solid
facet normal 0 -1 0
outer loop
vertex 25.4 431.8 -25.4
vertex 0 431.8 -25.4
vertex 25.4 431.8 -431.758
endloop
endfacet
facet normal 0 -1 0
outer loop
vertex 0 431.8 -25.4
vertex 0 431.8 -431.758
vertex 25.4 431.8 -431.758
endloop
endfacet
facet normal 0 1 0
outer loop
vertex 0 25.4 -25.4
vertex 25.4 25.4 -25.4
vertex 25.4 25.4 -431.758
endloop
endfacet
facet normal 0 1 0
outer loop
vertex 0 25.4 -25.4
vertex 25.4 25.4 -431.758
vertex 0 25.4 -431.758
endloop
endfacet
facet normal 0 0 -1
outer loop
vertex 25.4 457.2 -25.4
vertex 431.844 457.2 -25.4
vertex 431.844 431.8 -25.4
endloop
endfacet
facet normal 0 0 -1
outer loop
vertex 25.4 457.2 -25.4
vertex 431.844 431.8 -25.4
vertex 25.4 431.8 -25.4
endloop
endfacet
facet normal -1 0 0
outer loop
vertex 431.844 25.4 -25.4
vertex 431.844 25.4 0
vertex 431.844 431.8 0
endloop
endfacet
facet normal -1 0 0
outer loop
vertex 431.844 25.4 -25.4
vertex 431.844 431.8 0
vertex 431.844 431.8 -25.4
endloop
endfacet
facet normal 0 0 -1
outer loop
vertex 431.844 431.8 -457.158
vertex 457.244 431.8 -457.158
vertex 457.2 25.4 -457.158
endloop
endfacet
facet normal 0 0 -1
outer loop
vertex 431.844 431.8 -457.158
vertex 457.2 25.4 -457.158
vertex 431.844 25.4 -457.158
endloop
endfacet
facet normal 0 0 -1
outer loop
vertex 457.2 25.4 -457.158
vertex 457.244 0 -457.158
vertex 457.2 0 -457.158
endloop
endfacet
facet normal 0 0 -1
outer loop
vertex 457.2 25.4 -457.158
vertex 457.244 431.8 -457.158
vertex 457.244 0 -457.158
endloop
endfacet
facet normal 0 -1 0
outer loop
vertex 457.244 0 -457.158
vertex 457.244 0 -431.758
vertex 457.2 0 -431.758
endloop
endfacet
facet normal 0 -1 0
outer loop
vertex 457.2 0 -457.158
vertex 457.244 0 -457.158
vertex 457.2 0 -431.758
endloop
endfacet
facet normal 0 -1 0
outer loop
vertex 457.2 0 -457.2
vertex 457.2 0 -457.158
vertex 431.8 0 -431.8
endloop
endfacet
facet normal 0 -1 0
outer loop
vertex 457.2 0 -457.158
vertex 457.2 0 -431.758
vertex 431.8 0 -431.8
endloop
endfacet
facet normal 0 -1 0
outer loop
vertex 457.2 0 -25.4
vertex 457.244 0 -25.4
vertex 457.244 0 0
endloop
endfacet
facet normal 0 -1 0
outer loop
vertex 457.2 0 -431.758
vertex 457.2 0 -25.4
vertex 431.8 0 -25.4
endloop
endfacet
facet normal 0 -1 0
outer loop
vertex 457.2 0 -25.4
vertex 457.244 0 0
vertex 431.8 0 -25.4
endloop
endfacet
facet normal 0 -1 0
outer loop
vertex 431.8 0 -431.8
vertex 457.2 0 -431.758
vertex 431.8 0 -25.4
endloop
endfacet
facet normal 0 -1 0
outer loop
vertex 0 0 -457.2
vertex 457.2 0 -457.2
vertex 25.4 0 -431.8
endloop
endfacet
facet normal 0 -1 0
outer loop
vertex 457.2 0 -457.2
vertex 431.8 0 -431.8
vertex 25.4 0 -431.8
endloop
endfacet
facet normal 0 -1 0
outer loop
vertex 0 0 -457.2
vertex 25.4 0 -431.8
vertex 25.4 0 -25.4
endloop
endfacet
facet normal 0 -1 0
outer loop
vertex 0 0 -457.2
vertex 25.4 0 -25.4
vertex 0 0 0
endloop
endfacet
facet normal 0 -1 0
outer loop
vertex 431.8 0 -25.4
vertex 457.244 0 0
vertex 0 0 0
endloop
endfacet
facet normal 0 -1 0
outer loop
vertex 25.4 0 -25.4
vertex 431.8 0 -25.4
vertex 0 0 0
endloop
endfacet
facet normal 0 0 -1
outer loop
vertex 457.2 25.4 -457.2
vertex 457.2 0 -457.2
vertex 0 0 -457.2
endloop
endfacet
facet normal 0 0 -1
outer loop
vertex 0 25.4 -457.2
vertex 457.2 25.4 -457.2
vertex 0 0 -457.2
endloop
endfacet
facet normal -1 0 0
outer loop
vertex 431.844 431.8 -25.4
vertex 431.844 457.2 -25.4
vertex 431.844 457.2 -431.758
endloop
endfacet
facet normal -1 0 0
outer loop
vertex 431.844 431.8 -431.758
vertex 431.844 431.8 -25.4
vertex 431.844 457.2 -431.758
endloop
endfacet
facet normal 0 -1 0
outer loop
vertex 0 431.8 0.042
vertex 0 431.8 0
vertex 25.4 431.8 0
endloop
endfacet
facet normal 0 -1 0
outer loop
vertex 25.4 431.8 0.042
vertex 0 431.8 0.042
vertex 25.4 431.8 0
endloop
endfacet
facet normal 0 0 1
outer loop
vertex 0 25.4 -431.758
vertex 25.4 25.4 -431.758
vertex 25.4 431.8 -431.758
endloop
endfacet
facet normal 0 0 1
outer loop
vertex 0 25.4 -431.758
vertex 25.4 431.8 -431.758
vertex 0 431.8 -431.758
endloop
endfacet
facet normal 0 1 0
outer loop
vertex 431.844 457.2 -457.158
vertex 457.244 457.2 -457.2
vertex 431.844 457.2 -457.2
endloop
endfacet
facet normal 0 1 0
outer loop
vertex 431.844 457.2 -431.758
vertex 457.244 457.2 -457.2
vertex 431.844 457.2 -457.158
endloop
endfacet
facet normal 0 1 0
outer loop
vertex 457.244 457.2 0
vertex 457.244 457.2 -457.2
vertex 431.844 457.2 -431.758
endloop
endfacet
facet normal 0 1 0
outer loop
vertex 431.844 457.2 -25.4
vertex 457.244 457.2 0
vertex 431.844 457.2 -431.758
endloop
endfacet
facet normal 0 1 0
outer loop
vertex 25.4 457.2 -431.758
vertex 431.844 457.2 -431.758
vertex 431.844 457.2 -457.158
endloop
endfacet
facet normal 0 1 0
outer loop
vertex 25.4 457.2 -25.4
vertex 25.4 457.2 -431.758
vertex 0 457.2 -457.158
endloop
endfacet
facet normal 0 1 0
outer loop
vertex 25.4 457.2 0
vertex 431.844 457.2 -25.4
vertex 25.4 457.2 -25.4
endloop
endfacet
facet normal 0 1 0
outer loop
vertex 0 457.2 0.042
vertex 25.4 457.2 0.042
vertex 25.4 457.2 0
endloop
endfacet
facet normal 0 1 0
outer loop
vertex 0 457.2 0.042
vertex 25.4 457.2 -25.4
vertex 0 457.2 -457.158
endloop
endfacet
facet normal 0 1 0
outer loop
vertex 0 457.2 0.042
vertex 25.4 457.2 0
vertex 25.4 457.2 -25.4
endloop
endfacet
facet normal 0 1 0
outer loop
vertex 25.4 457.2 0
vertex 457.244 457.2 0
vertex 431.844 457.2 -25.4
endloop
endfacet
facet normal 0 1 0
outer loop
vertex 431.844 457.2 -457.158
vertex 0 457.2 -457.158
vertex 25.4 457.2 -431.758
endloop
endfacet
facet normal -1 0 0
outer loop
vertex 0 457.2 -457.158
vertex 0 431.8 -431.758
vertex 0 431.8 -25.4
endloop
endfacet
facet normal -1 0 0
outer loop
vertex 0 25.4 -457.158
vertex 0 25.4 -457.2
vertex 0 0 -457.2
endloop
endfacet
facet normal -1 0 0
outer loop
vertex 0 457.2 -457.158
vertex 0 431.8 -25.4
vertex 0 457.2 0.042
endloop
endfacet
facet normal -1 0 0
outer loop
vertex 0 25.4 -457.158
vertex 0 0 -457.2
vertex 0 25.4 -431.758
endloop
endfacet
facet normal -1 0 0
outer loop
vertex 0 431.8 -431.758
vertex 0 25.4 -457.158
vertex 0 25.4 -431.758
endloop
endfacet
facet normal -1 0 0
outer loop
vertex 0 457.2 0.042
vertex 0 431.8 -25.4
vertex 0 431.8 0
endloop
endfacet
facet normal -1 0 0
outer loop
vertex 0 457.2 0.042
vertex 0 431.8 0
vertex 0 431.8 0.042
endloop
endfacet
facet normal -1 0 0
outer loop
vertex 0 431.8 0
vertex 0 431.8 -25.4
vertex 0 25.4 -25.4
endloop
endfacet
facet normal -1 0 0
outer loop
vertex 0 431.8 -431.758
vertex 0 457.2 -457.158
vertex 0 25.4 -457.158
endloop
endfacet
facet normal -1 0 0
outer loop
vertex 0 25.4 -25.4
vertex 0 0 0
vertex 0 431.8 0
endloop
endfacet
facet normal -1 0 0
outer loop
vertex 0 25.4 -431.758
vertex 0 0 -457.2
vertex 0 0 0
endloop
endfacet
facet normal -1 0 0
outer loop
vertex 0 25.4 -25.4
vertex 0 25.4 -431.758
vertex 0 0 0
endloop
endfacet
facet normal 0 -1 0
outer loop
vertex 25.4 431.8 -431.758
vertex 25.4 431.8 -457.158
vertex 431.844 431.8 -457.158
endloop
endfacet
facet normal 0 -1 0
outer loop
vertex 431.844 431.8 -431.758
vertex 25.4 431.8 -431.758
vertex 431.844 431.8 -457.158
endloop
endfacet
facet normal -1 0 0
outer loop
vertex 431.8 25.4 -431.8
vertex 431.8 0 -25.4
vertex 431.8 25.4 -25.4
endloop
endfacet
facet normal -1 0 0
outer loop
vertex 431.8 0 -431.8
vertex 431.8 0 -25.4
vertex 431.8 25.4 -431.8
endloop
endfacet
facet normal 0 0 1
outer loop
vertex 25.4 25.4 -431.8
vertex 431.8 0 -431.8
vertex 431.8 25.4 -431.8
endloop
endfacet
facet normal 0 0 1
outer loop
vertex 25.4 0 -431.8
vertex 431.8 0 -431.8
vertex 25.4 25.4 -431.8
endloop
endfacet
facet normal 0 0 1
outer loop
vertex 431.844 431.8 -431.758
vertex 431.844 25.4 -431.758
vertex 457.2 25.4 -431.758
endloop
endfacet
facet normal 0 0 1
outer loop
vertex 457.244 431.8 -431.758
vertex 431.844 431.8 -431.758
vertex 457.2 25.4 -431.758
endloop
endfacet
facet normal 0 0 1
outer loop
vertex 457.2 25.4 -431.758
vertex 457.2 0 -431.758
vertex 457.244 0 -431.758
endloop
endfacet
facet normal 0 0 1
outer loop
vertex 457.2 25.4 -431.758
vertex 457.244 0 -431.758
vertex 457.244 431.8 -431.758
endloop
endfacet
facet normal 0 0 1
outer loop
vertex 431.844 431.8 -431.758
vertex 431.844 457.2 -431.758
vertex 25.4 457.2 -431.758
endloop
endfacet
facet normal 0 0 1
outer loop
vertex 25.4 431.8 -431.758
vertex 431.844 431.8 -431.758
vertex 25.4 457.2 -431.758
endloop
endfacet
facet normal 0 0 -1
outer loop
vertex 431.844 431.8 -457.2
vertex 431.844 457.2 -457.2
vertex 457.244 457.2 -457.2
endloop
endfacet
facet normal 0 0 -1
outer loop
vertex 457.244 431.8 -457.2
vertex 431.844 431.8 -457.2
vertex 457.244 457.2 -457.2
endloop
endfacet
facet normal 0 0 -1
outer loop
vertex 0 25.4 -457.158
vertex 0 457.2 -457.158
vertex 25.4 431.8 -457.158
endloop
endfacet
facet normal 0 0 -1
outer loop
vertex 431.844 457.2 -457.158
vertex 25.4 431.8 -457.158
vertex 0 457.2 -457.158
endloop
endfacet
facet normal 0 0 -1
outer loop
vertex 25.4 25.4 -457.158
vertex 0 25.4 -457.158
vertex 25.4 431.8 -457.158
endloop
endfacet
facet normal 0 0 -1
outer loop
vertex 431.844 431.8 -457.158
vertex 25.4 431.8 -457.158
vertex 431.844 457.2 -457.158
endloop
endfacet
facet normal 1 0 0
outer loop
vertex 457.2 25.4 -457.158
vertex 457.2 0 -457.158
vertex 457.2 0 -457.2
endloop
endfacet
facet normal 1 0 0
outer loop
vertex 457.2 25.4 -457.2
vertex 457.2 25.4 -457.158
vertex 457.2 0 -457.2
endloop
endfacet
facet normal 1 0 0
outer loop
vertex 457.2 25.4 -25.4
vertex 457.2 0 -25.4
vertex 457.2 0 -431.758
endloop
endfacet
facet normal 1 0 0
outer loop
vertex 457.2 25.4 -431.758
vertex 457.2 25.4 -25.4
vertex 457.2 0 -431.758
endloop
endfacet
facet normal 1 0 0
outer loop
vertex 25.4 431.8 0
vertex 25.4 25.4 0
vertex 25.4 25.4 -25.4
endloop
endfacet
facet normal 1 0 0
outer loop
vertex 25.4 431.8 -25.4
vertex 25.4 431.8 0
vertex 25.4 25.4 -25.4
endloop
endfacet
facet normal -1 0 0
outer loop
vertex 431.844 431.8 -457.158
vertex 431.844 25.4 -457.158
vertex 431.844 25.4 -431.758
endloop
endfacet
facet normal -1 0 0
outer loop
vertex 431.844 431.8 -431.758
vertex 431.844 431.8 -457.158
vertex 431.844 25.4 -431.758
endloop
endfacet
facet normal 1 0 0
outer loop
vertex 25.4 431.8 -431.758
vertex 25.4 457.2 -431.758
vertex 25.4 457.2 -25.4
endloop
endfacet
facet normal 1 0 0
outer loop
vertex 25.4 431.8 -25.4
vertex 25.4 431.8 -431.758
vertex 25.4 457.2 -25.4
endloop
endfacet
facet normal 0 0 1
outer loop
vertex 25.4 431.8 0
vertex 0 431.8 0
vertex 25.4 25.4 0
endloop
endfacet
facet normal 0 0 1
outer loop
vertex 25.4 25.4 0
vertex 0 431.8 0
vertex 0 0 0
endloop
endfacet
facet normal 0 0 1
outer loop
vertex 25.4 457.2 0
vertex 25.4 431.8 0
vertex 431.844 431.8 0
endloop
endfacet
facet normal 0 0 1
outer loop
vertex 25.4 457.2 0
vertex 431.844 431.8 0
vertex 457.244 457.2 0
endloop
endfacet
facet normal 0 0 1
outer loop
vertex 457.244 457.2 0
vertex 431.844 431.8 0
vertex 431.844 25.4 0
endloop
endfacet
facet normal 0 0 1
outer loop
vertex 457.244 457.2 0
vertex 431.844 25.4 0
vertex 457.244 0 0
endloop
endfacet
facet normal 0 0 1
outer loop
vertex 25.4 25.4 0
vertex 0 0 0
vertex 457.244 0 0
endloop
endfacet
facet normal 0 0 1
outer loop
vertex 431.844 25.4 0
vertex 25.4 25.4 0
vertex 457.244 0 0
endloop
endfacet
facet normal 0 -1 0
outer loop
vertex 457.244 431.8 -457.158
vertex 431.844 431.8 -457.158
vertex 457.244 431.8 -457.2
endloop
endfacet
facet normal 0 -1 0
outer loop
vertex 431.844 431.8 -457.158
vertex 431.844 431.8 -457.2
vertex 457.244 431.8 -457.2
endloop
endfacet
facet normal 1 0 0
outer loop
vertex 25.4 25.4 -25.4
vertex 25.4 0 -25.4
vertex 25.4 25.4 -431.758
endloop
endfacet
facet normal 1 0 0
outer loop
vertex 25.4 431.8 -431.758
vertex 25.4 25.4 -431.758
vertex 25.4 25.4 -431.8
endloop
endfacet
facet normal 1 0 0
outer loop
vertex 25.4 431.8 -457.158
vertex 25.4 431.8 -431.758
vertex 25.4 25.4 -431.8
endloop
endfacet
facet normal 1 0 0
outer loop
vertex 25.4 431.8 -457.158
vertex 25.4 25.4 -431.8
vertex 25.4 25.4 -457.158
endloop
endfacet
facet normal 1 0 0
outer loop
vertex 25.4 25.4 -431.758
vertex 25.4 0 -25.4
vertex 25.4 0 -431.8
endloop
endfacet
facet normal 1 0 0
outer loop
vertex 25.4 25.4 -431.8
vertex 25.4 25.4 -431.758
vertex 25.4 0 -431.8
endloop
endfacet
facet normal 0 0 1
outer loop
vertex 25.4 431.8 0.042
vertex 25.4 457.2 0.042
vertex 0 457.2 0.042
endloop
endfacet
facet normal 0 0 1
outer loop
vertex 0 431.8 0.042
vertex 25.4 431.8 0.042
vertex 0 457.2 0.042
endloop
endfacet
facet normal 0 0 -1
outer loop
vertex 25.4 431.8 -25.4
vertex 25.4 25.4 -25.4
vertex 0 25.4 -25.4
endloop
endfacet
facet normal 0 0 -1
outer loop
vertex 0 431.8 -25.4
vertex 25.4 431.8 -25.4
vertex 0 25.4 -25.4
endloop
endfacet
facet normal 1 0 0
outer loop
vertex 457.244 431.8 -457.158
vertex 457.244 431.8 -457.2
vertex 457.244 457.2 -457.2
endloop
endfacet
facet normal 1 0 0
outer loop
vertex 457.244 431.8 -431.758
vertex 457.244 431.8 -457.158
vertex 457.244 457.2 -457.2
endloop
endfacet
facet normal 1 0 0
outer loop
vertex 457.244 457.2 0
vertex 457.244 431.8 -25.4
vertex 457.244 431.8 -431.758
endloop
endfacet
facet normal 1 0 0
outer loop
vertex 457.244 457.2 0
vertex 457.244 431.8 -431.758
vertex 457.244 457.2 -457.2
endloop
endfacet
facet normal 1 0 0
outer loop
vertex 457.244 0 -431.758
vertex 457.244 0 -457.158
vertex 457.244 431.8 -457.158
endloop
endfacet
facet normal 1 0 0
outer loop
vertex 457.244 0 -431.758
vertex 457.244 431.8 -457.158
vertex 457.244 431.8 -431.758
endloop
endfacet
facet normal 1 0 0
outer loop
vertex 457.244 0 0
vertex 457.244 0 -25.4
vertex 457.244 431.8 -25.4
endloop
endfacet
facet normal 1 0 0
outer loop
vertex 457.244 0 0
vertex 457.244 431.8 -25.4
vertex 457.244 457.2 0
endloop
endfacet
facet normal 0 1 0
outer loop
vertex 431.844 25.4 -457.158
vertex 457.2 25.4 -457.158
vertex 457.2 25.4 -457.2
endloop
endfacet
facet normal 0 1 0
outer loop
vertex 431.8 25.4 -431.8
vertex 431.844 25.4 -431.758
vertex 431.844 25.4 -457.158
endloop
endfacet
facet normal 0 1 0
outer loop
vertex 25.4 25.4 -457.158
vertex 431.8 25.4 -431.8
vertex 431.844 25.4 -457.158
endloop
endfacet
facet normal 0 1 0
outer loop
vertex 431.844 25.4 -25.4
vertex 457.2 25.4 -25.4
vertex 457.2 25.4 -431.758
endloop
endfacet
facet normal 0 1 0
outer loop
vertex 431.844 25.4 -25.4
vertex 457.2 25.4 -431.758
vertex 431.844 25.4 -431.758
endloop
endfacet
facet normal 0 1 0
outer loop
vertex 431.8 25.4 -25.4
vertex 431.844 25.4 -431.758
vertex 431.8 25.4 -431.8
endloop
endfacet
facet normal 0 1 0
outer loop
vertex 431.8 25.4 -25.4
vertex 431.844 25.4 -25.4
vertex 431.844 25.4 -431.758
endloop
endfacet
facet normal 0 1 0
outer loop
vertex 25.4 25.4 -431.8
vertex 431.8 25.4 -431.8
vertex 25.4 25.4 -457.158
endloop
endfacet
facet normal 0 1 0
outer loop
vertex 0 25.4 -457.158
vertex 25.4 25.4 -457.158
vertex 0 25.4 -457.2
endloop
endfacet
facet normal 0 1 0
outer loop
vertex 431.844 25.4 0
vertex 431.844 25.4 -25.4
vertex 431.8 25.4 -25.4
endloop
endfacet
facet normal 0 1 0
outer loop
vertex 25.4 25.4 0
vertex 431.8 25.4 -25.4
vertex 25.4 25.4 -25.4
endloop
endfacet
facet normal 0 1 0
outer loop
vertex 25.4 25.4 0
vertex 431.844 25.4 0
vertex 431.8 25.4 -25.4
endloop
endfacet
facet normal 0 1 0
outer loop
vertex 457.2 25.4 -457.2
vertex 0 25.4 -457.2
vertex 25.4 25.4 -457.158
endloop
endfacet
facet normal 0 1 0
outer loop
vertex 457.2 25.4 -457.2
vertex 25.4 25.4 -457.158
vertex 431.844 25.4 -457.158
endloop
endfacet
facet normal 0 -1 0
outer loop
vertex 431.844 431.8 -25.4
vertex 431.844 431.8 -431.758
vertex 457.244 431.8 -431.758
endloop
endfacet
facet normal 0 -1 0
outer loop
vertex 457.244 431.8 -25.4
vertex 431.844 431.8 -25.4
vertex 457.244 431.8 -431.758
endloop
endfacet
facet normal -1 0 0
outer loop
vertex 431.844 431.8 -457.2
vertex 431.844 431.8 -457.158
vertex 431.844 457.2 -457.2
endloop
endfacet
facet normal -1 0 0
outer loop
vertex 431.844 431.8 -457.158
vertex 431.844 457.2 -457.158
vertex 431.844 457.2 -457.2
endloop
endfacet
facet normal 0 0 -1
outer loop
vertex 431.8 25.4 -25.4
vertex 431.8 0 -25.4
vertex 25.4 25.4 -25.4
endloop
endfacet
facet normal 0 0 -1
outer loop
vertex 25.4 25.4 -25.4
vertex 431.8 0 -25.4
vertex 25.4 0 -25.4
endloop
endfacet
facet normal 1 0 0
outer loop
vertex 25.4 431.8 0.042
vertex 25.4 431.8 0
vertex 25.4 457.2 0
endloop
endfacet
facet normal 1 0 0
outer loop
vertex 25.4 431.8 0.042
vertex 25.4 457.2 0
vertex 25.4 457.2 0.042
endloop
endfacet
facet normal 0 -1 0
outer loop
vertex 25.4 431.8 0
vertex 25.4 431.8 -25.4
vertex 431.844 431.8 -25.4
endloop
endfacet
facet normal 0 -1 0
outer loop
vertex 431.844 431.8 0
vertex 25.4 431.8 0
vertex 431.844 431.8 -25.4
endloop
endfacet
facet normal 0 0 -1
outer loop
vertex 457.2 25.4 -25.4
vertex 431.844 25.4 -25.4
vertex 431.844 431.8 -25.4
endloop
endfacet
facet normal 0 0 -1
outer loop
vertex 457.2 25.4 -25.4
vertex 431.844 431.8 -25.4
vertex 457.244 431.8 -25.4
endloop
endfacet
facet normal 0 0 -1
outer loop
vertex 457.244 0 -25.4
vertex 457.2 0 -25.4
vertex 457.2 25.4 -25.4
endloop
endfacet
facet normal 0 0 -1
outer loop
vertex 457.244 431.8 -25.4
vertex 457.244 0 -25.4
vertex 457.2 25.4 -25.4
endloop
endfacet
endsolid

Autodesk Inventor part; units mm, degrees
ref_plane "YZ Plane" through (0, 0, 0) normal (1, 0, 0) x (0, 1, 0)
ref_plane "XZ Plane" through (0, 0, 0) normal (0, 1, 0) x (-1, 0, 0)
ref_plane "XY Plane" through (0, 0, 0) normal (0, 0, 1) x (1, 0, 0)
sketch "Sketch1" plane through (0, 0, 0) normal (0, 1, 0) x (-1, 0, 0)
  line L0 (0, 0) -> (-457.2, 0)
  line L1 (-457.2, 0) -> (-457.2, -25.4)
  line L2 (-457.2, -25.4) -> (0, -25.4)
  line L3 (0, -25.4) -> (0, 0)
  line L4 (0, 0) -> (-25.4, 0)
  line L5 (-25.4, 0) -> (-25.4, -457.2)
  line L6 (-25.4, -457.2) -> (0, -457.2)
  line L7 (0, -457.2) -> (0, 0)
  line L8 (0, -457.2) -> (-457.2, -457.2)
  line L9 (-457.2, -457.2) -> (-457.2, -431.8)
  line L10 (-457.2, -431.8) -> (0, -431.8)
  line L11 (0, -431.8) -> (0, -457.2)
  line L12 (-457.2, 0) -> (-431.8, 0)
  line L13 (-431.8, 0) -> (-431.8, -457.2)
  line L14 (-431.8, -457.2) -> (-457.2, -457.2)
  line L15 (-457.2, -457.2) -> (-457.2, 0)
  dimension "d0" = 457.2
  dimension "d1" = 25.4
  dimension "d2" = 25.4
  dimension "d3" = 457.2
  dimension "d4" = 457.2
  dimension "d5" = 25.4
  dimension "d6" = 25.4
sketch "Sketch2" plane through (0, 0, 0) normal (0, 1, 0) x (-1, 0, 0)
  line L0 (0, 0) -> (-25.4, 0)
  line L1 (-25.4, 0) -> (-25.4, -25.4)
  line L2 (-25.4, -25.4) -> (0, -25.4)
  line L3 (0, -25.4) -> (0, 0)
  line L4 (0, -457.1579) -> (-25.4, -457.1579)
  line L5 (-25.4, -457.1579) -> (-25.4, -431.7579)
  line L6 (-25.4, -431.7579) -> (0, -431.7579)
  line L7 (0, -431.7579) -> (0, -457.1579)
  line L8 (-457.244, -457.1579) -> (-431.844, -457.1579)
  line L9 (-431.844, -457.1579) -> (-431.844, -431.7579)
  line L10 (-431.844, -431.7579) -> (-457.244, -431.7579)
  line L11 (-457.244, -431.7579) -> (-457.244, -457.1579)
  line L12 (-457.244, 0) -> (-431.844, 0)
  line L13 (-431.844, 0) -> (-431.844, -25.4)
  line L14 (-431.844, -25.4) -> (-457.244, -25.4)
  line L15 (-457.244, -25.4) -> (-457.244, 0)
  dimension "d7" = 25.4
  dimension "d8" = 25.4
  dimension "d9" = 25.4
  dimension "d10" = 25.4
  dimension "d11" = 25.4
  dimension "d12" = 25.4
  dimension "d13" = 25.4
  dimension "d14" = 25.4
sketch "Sketch3" plane through (0, 0, 0) normal (0, 0, 1) x (1, 0, 0)
  point P0 (0, 0)
sketch "Sketch4" plane through (0, 0, 0) normal (0, 0, 1) x (1, 0, 0)
  point P0 (0, 0)
extrude "Extrusion1" add sketch "Sketch1" along normal blind 25.4 contours L3 L2 L5 L0 | L5 L2 L13 L0 | L7 L10 L5 L2 | L13 L2 L1 L0 | L7 L6 L5 L10 | L13 L10 L15 L2 | L5 L8 L13 L10 | L13 L8 L9 L10
extrude "Extrusion2" add sketch "Sketch2" along normal blind 457.2
sketch "Sketch5" plane through (0, 457.2, 0) normal (0, 1, 0) x (1, 0, 0)
  line L0 (0, 0) -> (25.4, 0)
  line L1 (25.4, 0) -> (25.4, 25.4)
  line L2 (25.4, 25.4) -> (0, 25.4)
  line L3 (0, 25.4) -> (0, 0)
  line L4 (0, 457.1579) -> (25.4, 457.1579)
  line L5 (25.4, 457.1579) -> (25.4, -0.0421)
  line L6 (25.4, -0.0421) -> (0, -0.0421)
  line L7 (0, -0.0421) -> (0, 457.1579)
  line L8 (457.244, 25.4) -> (431.844, 25.4) projected
  line L9 (0, 0) -> (457.2, 0)
  line L10 (457.2, 0) -> (457.2, 25.4)
  line L11 (457.2, 25.4) -> (0, 25.4)
  line L12 (0, 25.4) -> (0, 0)
  line L13 (431.844, 431.7579) -> (457.244, 431.7579) projected
  line L14 (0, 457.1579) -> (457.2, 457.1579)
  line L15 (457.2, 457.1579) -> (457.2, 431.7579)
  line L16 (457.2, 431.7579) -> (0, 431.7579)
  line L17 (0, 431.7579) -> (0, 457.1579)
  line L18 (457.244, 0) -> (431.844, 0)
  line L19 (431.844, 0) -> (431.844, 457.2)
  line L20 (431.844, 457.2) -> (457.244, 457.2)
  line L21 (457.244, 457.2) -> (457.244, 0)
  dimension "d19" = 25.4
  dimension "d20" = 457.2
  dimension "d21" = 457.2
  dimension "d22" = 457.2
  dimension "d23" = 25.4
  dimension "d24" = 457.2
extrude "Extrusion3" add sketch "Sketch5" against normal blind 25.4 contours L3 L2 L1 L0 | L0 L5 L6 L7 | L1 L11 L19 L9 | L7 L16 L5 L2 | L19 L8 L10 L9 | L7 L4 L5 L16 | L5 L14 L19 L16 | L19 L13 L21 L8 | L10 L8 L21 L18 | L19 L14 L15 L13 | L19 L20 L21 L13 L15 L14
properties part number "Basic Frame"
